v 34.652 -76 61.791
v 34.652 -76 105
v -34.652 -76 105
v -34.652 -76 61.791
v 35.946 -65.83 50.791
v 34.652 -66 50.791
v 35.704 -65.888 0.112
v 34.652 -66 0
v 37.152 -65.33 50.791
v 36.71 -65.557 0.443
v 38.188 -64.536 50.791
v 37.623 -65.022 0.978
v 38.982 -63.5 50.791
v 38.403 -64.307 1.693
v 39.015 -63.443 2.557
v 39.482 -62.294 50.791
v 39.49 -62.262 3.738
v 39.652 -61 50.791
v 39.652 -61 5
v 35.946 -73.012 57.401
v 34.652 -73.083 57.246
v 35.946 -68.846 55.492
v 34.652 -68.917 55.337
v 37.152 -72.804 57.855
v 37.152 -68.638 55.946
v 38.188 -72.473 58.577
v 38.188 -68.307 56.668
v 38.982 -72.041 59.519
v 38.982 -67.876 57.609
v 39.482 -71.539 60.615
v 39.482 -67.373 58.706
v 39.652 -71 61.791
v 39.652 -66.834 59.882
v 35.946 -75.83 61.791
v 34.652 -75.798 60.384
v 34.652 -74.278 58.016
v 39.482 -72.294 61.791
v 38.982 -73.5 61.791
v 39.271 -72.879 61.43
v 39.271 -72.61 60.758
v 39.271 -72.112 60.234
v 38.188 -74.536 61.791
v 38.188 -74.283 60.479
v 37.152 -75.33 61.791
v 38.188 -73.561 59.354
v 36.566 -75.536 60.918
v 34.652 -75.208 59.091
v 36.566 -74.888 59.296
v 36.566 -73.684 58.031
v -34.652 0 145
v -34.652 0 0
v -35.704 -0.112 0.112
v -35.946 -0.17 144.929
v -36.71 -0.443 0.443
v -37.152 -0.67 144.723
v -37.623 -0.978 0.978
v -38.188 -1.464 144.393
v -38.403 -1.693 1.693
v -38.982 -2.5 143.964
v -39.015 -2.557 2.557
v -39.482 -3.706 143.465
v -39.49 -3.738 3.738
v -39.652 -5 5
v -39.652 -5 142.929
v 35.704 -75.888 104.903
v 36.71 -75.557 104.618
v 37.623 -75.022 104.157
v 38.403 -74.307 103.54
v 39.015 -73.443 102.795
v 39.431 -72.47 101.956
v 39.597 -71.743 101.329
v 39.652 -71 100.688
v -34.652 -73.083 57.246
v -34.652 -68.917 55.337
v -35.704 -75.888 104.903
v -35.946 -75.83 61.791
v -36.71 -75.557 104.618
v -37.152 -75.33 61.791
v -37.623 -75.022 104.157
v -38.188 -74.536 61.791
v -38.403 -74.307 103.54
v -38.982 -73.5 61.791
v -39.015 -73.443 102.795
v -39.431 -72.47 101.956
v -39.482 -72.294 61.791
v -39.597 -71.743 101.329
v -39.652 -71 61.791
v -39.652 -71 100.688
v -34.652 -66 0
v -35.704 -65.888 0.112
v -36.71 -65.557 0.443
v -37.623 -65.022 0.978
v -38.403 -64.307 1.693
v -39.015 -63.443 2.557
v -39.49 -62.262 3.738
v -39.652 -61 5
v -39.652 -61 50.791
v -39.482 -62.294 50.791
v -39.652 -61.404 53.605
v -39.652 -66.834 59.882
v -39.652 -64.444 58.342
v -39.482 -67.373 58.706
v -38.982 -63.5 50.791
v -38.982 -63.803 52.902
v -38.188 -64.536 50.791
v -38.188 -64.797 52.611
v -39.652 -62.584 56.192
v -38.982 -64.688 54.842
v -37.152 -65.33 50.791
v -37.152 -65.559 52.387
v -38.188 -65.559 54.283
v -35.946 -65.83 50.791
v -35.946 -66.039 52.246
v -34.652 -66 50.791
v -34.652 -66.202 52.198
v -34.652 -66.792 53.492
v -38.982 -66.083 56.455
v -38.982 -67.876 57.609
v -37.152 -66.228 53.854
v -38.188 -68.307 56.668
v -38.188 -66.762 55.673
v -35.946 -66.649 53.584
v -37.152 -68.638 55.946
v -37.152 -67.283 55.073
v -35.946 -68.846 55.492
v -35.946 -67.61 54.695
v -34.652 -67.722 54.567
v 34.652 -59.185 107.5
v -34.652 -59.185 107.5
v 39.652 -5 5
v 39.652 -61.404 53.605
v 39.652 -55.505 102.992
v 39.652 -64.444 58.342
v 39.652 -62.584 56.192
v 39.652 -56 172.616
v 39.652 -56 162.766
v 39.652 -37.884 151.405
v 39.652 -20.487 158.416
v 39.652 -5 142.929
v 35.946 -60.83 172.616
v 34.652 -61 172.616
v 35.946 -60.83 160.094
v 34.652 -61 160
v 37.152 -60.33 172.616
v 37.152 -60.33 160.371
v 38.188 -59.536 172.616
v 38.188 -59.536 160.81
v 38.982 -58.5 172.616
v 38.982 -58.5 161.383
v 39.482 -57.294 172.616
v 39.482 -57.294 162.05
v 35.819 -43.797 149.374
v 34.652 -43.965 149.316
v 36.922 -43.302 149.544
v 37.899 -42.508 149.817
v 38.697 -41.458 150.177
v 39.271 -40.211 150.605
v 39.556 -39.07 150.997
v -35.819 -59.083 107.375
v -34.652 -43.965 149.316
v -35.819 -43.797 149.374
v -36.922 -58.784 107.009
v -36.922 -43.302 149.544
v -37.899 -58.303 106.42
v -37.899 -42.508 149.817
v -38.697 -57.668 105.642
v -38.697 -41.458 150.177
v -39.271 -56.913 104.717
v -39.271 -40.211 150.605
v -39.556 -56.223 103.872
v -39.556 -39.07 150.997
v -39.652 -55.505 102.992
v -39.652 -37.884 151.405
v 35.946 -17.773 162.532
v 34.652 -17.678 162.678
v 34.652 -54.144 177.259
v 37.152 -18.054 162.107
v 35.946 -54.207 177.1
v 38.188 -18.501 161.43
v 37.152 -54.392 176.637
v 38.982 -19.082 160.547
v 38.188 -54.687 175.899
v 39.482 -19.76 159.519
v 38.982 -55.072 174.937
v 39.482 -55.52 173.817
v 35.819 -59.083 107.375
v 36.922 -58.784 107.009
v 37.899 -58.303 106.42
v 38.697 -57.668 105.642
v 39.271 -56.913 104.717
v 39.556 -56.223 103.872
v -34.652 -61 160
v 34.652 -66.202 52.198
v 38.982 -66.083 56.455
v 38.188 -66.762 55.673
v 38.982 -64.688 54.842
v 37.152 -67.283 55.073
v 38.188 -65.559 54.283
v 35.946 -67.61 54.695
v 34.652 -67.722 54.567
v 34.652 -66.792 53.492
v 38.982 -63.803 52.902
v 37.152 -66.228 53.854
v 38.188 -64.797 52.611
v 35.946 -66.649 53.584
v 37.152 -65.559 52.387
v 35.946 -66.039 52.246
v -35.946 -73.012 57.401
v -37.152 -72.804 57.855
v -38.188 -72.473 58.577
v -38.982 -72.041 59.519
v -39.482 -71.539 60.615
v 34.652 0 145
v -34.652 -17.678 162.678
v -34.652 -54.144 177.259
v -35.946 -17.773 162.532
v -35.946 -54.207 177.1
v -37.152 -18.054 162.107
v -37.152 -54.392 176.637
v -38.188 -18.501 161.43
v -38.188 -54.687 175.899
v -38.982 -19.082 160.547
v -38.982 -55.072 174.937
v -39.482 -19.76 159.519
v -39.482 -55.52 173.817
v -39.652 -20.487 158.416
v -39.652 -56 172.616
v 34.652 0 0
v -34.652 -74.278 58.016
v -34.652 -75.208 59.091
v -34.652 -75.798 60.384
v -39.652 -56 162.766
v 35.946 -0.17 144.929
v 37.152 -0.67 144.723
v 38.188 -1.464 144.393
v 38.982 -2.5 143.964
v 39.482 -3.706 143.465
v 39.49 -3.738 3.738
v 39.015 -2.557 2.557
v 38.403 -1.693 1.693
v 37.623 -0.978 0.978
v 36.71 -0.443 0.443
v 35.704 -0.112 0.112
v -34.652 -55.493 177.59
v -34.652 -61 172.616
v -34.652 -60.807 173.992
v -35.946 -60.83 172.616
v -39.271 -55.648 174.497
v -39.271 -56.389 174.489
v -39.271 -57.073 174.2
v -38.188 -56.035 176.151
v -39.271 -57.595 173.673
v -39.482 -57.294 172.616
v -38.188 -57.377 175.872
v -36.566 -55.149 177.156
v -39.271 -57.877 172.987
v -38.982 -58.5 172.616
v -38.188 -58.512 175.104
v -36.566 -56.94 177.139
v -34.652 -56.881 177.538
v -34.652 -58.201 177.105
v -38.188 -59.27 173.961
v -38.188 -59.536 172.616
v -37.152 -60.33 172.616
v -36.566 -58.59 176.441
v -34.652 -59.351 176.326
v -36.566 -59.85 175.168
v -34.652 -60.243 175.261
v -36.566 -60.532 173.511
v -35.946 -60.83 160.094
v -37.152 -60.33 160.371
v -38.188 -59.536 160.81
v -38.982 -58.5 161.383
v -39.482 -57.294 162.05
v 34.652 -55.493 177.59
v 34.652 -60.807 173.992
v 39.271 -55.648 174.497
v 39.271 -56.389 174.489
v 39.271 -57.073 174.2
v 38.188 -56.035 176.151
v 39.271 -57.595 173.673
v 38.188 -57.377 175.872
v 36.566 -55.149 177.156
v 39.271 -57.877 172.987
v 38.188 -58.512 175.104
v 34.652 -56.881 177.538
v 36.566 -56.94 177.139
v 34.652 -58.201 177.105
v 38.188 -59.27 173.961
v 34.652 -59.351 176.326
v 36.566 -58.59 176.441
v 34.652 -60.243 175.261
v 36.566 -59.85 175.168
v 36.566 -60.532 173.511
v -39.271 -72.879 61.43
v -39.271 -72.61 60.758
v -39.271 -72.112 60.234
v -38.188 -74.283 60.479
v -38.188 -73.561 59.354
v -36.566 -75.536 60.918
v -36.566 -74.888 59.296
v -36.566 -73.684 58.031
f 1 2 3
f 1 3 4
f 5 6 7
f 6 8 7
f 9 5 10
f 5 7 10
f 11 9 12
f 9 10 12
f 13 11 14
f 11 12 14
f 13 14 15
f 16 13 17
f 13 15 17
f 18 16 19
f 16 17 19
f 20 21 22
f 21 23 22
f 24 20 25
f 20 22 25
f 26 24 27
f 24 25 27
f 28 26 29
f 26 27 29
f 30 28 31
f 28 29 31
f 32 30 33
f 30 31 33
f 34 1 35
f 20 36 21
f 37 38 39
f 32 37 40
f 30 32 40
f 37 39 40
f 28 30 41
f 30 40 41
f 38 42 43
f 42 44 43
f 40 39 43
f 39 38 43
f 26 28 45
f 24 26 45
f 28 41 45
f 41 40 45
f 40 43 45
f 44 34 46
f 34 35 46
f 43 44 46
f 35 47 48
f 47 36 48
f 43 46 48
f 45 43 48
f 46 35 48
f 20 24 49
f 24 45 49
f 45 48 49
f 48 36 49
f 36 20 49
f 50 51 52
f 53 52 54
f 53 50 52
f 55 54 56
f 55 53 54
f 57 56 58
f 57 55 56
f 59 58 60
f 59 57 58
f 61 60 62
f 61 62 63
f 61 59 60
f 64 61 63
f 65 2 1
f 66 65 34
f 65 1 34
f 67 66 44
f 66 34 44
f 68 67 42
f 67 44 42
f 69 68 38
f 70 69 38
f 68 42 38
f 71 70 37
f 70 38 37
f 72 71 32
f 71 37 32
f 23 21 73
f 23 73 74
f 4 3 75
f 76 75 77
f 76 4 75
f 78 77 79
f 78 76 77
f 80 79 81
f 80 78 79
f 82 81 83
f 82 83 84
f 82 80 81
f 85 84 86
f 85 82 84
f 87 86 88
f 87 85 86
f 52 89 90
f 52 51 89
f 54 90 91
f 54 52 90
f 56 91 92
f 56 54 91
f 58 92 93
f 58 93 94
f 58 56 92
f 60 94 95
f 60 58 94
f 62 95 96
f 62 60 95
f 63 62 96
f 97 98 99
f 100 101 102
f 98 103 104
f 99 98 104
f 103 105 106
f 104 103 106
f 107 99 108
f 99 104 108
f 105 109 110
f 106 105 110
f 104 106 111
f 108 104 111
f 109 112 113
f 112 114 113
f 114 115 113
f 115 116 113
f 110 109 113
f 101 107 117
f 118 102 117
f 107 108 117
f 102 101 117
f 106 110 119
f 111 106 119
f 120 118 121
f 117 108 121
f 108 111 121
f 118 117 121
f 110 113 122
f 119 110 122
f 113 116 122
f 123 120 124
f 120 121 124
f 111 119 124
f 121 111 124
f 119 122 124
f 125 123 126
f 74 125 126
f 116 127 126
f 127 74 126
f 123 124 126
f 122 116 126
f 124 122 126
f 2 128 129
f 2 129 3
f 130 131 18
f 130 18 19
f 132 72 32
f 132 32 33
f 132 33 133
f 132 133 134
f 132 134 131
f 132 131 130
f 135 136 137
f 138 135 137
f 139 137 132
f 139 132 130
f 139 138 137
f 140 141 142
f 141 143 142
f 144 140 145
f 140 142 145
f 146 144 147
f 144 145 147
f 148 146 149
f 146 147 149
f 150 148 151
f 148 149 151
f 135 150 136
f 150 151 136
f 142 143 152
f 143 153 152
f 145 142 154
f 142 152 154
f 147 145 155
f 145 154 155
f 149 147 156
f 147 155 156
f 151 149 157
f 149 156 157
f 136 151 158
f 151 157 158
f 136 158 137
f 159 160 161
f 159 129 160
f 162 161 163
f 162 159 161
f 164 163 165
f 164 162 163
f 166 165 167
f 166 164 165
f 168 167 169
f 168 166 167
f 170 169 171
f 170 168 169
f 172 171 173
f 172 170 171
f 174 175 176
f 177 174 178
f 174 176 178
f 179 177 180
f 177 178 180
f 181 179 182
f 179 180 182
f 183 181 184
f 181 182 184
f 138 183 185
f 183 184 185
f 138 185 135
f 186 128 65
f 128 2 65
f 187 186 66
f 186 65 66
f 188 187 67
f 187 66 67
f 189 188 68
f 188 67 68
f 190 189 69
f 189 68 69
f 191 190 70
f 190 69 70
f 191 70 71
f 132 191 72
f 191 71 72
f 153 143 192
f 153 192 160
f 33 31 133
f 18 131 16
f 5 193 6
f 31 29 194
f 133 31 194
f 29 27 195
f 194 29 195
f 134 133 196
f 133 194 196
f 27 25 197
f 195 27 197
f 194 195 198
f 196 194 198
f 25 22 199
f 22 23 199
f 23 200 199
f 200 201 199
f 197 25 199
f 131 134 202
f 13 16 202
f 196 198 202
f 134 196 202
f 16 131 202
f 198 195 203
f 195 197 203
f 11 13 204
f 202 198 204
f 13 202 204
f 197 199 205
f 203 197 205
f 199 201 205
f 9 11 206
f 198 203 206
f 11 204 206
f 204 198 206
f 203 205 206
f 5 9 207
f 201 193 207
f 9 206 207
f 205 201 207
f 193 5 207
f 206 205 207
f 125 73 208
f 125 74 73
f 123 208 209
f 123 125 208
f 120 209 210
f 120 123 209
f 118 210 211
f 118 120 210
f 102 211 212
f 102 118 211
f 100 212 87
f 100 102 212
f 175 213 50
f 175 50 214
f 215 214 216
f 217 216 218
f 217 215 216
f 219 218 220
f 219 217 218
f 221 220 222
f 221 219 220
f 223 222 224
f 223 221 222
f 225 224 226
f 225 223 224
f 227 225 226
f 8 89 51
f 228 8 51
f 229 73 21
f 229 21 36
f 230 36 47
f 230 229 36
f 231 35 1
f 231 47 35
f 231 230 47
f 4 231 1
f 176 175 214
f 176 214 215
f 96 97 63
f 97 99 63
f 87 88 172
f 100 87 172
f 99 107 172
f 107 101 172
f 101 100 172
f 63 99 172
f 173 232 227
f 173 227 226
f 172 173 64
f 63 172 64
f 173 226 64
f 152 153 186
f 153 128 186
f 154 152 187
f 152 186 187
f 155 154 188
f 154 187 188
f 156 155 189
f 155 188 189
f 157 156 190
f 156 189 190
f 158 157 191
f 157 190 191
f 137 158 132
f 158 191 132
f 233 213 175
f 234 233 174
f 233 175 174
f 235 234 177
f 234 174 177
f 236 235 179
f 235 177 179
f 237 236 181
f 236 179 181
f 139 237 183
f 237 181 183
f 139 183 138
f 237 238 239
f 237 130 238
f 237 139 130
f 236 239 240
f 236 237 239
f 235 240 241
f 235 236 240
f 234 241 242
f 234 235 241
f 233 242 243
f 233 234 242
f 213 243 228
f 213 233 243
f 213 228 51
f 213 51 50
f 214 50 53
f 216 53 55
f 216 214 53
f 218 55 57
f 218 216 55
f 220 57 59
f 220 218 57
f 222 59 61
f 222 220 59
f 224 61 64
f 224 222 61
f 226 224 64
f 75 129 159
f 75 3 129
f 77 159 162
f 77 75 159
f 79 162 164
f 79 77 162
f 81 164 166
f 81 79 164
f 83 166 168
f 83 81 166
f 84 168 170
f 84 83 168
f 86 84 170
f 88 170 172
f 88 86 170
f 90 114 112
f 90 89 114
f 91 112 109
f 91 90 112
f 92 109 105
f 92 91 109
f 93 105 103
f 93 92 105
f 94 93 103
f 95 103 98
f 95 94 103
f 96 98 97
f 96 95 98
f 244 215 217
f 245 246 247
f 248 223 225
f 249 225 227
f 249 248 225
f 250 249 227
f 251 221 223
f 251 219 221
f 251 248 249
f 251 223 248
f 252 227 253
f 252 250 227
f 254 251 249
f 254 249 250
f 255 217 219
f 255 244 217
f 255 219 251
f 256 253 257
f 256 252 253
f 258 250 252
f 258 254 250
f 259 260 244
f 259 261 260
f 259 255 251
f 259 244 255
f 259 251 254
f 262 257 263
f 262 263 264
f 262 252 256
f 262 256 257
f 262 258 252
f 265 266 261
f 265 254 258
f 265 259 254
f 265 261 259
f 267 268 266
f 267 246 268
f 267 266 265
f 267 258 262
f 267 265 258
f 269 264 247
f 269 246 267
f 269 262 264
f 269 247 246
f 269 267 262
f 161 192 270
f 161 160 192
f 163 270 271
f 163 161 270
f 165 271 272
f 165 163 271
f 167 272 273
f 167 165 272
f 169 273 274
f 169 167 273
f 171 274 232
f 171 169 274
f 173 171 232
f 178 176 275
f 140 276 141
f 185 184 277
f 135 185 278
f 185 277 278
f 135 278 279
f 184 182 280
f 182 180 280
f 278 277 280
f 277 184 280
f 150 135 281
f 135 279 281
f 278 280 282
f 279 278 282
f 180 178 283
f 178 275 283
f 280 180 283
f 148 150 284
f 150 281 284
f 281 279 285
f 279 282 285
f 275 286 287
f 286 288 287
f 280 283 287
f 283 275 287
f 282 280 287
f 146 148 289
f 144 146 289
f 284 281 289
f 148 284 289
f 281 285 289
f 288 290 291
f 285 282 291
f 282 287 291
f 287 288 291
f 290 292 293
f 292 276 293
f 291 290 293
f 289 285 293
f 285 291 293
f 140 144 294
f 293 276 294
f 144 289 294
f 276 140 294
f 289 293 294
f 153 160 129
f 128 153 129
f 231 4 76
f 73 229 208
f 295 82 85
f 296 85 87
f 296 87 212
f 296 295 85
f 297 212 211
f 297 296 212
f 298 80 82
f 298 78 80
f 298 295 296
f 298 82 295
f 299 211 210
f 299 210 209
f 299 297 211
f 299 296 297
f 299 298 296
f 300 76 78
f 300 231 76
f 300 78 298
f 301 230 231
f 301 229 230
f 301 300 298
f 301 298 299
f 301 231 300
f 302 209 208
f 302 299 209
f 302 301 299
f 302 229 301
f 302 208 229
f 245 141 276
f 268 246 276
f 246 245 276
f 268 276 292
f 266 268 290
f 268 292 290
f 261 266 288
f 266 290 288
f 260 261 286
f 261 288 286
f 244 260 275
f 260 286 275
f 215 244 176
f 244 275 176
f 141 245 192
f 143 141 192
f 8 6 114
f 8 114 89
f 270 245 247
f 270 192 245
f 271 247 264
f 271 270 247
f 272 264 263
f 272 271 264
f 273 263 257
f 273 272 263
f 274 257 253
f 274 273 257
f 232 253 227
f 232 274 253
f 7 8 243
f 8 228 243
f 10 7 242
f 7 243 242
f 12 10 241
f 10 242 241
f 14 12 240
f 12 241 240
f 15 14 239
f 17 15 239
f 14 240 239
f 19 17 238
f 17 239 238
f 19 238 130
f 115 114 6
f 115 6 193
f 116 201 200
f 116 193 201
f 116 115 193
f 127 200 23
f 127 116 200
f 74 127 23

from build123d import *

# Parameters (mm, degrees)
F1_DEPTH = 39.652094
F2_R     = 5


with BuildPart() as f1:
    # F0 (on Right) → F1 (new body, symmetric)
    with BuildSketch(Plane.YZ):
        Polygon((-66, 0), (0, 0), (0, 145), (-17.67767, 162.67767), (-61, 180), (-61, 160), (-43.964932, 149.316322), (-59.184828, 107.5), (-76, 105), (-76, 58.582576), (-66, 54), align=None)
    extrude(amount=F1_DEPTH, both=True)

    # F2
    f2_edges = [f1.edges().sort_by_distance(p)[0] for p in [
        (0, -76, 58.582576),
        (0, -66, 54),
        (-39.652094, -66, 27),
        (-39.652094, -76, 81.791288),
        (-39.652094, -67.592414, 106.25),
        (-39.652094, -51.57488, 128.408161),
        (-39.652094, -33, 0),
        (-39.652094, 0, 72.5),
        (-39.652094, -8.838835, 153.838835),
        (-39.652094, -39.338835, 171.338835),
        (-39.652094, -61, 170),
        (-39.652094, -52.482466, 154.658161),
        (-39.652094, -71, 56.291288),
        (39.652094, -33, 0),
        (39.652094, 0, 72.5),
        (39.652094, -8.838835, 153.838835),
        (39.652094, -39.338835, 171.338835),
        (39.652094, -61, 170),
        (39.652094, -52.482466, 154.658161),
        (39.652094, -51.57488, 128.408161),
        (39.652094, -67.592414, 106.25),
        (39.652094, -76, 81.791288),
        (39.652094, -71, 56.291288),
        (39.652094, -66, 27),
        (0, -61, 180),
    ]]
    fillet(f2_edges, radius=F2_R)


solid = f1.part
